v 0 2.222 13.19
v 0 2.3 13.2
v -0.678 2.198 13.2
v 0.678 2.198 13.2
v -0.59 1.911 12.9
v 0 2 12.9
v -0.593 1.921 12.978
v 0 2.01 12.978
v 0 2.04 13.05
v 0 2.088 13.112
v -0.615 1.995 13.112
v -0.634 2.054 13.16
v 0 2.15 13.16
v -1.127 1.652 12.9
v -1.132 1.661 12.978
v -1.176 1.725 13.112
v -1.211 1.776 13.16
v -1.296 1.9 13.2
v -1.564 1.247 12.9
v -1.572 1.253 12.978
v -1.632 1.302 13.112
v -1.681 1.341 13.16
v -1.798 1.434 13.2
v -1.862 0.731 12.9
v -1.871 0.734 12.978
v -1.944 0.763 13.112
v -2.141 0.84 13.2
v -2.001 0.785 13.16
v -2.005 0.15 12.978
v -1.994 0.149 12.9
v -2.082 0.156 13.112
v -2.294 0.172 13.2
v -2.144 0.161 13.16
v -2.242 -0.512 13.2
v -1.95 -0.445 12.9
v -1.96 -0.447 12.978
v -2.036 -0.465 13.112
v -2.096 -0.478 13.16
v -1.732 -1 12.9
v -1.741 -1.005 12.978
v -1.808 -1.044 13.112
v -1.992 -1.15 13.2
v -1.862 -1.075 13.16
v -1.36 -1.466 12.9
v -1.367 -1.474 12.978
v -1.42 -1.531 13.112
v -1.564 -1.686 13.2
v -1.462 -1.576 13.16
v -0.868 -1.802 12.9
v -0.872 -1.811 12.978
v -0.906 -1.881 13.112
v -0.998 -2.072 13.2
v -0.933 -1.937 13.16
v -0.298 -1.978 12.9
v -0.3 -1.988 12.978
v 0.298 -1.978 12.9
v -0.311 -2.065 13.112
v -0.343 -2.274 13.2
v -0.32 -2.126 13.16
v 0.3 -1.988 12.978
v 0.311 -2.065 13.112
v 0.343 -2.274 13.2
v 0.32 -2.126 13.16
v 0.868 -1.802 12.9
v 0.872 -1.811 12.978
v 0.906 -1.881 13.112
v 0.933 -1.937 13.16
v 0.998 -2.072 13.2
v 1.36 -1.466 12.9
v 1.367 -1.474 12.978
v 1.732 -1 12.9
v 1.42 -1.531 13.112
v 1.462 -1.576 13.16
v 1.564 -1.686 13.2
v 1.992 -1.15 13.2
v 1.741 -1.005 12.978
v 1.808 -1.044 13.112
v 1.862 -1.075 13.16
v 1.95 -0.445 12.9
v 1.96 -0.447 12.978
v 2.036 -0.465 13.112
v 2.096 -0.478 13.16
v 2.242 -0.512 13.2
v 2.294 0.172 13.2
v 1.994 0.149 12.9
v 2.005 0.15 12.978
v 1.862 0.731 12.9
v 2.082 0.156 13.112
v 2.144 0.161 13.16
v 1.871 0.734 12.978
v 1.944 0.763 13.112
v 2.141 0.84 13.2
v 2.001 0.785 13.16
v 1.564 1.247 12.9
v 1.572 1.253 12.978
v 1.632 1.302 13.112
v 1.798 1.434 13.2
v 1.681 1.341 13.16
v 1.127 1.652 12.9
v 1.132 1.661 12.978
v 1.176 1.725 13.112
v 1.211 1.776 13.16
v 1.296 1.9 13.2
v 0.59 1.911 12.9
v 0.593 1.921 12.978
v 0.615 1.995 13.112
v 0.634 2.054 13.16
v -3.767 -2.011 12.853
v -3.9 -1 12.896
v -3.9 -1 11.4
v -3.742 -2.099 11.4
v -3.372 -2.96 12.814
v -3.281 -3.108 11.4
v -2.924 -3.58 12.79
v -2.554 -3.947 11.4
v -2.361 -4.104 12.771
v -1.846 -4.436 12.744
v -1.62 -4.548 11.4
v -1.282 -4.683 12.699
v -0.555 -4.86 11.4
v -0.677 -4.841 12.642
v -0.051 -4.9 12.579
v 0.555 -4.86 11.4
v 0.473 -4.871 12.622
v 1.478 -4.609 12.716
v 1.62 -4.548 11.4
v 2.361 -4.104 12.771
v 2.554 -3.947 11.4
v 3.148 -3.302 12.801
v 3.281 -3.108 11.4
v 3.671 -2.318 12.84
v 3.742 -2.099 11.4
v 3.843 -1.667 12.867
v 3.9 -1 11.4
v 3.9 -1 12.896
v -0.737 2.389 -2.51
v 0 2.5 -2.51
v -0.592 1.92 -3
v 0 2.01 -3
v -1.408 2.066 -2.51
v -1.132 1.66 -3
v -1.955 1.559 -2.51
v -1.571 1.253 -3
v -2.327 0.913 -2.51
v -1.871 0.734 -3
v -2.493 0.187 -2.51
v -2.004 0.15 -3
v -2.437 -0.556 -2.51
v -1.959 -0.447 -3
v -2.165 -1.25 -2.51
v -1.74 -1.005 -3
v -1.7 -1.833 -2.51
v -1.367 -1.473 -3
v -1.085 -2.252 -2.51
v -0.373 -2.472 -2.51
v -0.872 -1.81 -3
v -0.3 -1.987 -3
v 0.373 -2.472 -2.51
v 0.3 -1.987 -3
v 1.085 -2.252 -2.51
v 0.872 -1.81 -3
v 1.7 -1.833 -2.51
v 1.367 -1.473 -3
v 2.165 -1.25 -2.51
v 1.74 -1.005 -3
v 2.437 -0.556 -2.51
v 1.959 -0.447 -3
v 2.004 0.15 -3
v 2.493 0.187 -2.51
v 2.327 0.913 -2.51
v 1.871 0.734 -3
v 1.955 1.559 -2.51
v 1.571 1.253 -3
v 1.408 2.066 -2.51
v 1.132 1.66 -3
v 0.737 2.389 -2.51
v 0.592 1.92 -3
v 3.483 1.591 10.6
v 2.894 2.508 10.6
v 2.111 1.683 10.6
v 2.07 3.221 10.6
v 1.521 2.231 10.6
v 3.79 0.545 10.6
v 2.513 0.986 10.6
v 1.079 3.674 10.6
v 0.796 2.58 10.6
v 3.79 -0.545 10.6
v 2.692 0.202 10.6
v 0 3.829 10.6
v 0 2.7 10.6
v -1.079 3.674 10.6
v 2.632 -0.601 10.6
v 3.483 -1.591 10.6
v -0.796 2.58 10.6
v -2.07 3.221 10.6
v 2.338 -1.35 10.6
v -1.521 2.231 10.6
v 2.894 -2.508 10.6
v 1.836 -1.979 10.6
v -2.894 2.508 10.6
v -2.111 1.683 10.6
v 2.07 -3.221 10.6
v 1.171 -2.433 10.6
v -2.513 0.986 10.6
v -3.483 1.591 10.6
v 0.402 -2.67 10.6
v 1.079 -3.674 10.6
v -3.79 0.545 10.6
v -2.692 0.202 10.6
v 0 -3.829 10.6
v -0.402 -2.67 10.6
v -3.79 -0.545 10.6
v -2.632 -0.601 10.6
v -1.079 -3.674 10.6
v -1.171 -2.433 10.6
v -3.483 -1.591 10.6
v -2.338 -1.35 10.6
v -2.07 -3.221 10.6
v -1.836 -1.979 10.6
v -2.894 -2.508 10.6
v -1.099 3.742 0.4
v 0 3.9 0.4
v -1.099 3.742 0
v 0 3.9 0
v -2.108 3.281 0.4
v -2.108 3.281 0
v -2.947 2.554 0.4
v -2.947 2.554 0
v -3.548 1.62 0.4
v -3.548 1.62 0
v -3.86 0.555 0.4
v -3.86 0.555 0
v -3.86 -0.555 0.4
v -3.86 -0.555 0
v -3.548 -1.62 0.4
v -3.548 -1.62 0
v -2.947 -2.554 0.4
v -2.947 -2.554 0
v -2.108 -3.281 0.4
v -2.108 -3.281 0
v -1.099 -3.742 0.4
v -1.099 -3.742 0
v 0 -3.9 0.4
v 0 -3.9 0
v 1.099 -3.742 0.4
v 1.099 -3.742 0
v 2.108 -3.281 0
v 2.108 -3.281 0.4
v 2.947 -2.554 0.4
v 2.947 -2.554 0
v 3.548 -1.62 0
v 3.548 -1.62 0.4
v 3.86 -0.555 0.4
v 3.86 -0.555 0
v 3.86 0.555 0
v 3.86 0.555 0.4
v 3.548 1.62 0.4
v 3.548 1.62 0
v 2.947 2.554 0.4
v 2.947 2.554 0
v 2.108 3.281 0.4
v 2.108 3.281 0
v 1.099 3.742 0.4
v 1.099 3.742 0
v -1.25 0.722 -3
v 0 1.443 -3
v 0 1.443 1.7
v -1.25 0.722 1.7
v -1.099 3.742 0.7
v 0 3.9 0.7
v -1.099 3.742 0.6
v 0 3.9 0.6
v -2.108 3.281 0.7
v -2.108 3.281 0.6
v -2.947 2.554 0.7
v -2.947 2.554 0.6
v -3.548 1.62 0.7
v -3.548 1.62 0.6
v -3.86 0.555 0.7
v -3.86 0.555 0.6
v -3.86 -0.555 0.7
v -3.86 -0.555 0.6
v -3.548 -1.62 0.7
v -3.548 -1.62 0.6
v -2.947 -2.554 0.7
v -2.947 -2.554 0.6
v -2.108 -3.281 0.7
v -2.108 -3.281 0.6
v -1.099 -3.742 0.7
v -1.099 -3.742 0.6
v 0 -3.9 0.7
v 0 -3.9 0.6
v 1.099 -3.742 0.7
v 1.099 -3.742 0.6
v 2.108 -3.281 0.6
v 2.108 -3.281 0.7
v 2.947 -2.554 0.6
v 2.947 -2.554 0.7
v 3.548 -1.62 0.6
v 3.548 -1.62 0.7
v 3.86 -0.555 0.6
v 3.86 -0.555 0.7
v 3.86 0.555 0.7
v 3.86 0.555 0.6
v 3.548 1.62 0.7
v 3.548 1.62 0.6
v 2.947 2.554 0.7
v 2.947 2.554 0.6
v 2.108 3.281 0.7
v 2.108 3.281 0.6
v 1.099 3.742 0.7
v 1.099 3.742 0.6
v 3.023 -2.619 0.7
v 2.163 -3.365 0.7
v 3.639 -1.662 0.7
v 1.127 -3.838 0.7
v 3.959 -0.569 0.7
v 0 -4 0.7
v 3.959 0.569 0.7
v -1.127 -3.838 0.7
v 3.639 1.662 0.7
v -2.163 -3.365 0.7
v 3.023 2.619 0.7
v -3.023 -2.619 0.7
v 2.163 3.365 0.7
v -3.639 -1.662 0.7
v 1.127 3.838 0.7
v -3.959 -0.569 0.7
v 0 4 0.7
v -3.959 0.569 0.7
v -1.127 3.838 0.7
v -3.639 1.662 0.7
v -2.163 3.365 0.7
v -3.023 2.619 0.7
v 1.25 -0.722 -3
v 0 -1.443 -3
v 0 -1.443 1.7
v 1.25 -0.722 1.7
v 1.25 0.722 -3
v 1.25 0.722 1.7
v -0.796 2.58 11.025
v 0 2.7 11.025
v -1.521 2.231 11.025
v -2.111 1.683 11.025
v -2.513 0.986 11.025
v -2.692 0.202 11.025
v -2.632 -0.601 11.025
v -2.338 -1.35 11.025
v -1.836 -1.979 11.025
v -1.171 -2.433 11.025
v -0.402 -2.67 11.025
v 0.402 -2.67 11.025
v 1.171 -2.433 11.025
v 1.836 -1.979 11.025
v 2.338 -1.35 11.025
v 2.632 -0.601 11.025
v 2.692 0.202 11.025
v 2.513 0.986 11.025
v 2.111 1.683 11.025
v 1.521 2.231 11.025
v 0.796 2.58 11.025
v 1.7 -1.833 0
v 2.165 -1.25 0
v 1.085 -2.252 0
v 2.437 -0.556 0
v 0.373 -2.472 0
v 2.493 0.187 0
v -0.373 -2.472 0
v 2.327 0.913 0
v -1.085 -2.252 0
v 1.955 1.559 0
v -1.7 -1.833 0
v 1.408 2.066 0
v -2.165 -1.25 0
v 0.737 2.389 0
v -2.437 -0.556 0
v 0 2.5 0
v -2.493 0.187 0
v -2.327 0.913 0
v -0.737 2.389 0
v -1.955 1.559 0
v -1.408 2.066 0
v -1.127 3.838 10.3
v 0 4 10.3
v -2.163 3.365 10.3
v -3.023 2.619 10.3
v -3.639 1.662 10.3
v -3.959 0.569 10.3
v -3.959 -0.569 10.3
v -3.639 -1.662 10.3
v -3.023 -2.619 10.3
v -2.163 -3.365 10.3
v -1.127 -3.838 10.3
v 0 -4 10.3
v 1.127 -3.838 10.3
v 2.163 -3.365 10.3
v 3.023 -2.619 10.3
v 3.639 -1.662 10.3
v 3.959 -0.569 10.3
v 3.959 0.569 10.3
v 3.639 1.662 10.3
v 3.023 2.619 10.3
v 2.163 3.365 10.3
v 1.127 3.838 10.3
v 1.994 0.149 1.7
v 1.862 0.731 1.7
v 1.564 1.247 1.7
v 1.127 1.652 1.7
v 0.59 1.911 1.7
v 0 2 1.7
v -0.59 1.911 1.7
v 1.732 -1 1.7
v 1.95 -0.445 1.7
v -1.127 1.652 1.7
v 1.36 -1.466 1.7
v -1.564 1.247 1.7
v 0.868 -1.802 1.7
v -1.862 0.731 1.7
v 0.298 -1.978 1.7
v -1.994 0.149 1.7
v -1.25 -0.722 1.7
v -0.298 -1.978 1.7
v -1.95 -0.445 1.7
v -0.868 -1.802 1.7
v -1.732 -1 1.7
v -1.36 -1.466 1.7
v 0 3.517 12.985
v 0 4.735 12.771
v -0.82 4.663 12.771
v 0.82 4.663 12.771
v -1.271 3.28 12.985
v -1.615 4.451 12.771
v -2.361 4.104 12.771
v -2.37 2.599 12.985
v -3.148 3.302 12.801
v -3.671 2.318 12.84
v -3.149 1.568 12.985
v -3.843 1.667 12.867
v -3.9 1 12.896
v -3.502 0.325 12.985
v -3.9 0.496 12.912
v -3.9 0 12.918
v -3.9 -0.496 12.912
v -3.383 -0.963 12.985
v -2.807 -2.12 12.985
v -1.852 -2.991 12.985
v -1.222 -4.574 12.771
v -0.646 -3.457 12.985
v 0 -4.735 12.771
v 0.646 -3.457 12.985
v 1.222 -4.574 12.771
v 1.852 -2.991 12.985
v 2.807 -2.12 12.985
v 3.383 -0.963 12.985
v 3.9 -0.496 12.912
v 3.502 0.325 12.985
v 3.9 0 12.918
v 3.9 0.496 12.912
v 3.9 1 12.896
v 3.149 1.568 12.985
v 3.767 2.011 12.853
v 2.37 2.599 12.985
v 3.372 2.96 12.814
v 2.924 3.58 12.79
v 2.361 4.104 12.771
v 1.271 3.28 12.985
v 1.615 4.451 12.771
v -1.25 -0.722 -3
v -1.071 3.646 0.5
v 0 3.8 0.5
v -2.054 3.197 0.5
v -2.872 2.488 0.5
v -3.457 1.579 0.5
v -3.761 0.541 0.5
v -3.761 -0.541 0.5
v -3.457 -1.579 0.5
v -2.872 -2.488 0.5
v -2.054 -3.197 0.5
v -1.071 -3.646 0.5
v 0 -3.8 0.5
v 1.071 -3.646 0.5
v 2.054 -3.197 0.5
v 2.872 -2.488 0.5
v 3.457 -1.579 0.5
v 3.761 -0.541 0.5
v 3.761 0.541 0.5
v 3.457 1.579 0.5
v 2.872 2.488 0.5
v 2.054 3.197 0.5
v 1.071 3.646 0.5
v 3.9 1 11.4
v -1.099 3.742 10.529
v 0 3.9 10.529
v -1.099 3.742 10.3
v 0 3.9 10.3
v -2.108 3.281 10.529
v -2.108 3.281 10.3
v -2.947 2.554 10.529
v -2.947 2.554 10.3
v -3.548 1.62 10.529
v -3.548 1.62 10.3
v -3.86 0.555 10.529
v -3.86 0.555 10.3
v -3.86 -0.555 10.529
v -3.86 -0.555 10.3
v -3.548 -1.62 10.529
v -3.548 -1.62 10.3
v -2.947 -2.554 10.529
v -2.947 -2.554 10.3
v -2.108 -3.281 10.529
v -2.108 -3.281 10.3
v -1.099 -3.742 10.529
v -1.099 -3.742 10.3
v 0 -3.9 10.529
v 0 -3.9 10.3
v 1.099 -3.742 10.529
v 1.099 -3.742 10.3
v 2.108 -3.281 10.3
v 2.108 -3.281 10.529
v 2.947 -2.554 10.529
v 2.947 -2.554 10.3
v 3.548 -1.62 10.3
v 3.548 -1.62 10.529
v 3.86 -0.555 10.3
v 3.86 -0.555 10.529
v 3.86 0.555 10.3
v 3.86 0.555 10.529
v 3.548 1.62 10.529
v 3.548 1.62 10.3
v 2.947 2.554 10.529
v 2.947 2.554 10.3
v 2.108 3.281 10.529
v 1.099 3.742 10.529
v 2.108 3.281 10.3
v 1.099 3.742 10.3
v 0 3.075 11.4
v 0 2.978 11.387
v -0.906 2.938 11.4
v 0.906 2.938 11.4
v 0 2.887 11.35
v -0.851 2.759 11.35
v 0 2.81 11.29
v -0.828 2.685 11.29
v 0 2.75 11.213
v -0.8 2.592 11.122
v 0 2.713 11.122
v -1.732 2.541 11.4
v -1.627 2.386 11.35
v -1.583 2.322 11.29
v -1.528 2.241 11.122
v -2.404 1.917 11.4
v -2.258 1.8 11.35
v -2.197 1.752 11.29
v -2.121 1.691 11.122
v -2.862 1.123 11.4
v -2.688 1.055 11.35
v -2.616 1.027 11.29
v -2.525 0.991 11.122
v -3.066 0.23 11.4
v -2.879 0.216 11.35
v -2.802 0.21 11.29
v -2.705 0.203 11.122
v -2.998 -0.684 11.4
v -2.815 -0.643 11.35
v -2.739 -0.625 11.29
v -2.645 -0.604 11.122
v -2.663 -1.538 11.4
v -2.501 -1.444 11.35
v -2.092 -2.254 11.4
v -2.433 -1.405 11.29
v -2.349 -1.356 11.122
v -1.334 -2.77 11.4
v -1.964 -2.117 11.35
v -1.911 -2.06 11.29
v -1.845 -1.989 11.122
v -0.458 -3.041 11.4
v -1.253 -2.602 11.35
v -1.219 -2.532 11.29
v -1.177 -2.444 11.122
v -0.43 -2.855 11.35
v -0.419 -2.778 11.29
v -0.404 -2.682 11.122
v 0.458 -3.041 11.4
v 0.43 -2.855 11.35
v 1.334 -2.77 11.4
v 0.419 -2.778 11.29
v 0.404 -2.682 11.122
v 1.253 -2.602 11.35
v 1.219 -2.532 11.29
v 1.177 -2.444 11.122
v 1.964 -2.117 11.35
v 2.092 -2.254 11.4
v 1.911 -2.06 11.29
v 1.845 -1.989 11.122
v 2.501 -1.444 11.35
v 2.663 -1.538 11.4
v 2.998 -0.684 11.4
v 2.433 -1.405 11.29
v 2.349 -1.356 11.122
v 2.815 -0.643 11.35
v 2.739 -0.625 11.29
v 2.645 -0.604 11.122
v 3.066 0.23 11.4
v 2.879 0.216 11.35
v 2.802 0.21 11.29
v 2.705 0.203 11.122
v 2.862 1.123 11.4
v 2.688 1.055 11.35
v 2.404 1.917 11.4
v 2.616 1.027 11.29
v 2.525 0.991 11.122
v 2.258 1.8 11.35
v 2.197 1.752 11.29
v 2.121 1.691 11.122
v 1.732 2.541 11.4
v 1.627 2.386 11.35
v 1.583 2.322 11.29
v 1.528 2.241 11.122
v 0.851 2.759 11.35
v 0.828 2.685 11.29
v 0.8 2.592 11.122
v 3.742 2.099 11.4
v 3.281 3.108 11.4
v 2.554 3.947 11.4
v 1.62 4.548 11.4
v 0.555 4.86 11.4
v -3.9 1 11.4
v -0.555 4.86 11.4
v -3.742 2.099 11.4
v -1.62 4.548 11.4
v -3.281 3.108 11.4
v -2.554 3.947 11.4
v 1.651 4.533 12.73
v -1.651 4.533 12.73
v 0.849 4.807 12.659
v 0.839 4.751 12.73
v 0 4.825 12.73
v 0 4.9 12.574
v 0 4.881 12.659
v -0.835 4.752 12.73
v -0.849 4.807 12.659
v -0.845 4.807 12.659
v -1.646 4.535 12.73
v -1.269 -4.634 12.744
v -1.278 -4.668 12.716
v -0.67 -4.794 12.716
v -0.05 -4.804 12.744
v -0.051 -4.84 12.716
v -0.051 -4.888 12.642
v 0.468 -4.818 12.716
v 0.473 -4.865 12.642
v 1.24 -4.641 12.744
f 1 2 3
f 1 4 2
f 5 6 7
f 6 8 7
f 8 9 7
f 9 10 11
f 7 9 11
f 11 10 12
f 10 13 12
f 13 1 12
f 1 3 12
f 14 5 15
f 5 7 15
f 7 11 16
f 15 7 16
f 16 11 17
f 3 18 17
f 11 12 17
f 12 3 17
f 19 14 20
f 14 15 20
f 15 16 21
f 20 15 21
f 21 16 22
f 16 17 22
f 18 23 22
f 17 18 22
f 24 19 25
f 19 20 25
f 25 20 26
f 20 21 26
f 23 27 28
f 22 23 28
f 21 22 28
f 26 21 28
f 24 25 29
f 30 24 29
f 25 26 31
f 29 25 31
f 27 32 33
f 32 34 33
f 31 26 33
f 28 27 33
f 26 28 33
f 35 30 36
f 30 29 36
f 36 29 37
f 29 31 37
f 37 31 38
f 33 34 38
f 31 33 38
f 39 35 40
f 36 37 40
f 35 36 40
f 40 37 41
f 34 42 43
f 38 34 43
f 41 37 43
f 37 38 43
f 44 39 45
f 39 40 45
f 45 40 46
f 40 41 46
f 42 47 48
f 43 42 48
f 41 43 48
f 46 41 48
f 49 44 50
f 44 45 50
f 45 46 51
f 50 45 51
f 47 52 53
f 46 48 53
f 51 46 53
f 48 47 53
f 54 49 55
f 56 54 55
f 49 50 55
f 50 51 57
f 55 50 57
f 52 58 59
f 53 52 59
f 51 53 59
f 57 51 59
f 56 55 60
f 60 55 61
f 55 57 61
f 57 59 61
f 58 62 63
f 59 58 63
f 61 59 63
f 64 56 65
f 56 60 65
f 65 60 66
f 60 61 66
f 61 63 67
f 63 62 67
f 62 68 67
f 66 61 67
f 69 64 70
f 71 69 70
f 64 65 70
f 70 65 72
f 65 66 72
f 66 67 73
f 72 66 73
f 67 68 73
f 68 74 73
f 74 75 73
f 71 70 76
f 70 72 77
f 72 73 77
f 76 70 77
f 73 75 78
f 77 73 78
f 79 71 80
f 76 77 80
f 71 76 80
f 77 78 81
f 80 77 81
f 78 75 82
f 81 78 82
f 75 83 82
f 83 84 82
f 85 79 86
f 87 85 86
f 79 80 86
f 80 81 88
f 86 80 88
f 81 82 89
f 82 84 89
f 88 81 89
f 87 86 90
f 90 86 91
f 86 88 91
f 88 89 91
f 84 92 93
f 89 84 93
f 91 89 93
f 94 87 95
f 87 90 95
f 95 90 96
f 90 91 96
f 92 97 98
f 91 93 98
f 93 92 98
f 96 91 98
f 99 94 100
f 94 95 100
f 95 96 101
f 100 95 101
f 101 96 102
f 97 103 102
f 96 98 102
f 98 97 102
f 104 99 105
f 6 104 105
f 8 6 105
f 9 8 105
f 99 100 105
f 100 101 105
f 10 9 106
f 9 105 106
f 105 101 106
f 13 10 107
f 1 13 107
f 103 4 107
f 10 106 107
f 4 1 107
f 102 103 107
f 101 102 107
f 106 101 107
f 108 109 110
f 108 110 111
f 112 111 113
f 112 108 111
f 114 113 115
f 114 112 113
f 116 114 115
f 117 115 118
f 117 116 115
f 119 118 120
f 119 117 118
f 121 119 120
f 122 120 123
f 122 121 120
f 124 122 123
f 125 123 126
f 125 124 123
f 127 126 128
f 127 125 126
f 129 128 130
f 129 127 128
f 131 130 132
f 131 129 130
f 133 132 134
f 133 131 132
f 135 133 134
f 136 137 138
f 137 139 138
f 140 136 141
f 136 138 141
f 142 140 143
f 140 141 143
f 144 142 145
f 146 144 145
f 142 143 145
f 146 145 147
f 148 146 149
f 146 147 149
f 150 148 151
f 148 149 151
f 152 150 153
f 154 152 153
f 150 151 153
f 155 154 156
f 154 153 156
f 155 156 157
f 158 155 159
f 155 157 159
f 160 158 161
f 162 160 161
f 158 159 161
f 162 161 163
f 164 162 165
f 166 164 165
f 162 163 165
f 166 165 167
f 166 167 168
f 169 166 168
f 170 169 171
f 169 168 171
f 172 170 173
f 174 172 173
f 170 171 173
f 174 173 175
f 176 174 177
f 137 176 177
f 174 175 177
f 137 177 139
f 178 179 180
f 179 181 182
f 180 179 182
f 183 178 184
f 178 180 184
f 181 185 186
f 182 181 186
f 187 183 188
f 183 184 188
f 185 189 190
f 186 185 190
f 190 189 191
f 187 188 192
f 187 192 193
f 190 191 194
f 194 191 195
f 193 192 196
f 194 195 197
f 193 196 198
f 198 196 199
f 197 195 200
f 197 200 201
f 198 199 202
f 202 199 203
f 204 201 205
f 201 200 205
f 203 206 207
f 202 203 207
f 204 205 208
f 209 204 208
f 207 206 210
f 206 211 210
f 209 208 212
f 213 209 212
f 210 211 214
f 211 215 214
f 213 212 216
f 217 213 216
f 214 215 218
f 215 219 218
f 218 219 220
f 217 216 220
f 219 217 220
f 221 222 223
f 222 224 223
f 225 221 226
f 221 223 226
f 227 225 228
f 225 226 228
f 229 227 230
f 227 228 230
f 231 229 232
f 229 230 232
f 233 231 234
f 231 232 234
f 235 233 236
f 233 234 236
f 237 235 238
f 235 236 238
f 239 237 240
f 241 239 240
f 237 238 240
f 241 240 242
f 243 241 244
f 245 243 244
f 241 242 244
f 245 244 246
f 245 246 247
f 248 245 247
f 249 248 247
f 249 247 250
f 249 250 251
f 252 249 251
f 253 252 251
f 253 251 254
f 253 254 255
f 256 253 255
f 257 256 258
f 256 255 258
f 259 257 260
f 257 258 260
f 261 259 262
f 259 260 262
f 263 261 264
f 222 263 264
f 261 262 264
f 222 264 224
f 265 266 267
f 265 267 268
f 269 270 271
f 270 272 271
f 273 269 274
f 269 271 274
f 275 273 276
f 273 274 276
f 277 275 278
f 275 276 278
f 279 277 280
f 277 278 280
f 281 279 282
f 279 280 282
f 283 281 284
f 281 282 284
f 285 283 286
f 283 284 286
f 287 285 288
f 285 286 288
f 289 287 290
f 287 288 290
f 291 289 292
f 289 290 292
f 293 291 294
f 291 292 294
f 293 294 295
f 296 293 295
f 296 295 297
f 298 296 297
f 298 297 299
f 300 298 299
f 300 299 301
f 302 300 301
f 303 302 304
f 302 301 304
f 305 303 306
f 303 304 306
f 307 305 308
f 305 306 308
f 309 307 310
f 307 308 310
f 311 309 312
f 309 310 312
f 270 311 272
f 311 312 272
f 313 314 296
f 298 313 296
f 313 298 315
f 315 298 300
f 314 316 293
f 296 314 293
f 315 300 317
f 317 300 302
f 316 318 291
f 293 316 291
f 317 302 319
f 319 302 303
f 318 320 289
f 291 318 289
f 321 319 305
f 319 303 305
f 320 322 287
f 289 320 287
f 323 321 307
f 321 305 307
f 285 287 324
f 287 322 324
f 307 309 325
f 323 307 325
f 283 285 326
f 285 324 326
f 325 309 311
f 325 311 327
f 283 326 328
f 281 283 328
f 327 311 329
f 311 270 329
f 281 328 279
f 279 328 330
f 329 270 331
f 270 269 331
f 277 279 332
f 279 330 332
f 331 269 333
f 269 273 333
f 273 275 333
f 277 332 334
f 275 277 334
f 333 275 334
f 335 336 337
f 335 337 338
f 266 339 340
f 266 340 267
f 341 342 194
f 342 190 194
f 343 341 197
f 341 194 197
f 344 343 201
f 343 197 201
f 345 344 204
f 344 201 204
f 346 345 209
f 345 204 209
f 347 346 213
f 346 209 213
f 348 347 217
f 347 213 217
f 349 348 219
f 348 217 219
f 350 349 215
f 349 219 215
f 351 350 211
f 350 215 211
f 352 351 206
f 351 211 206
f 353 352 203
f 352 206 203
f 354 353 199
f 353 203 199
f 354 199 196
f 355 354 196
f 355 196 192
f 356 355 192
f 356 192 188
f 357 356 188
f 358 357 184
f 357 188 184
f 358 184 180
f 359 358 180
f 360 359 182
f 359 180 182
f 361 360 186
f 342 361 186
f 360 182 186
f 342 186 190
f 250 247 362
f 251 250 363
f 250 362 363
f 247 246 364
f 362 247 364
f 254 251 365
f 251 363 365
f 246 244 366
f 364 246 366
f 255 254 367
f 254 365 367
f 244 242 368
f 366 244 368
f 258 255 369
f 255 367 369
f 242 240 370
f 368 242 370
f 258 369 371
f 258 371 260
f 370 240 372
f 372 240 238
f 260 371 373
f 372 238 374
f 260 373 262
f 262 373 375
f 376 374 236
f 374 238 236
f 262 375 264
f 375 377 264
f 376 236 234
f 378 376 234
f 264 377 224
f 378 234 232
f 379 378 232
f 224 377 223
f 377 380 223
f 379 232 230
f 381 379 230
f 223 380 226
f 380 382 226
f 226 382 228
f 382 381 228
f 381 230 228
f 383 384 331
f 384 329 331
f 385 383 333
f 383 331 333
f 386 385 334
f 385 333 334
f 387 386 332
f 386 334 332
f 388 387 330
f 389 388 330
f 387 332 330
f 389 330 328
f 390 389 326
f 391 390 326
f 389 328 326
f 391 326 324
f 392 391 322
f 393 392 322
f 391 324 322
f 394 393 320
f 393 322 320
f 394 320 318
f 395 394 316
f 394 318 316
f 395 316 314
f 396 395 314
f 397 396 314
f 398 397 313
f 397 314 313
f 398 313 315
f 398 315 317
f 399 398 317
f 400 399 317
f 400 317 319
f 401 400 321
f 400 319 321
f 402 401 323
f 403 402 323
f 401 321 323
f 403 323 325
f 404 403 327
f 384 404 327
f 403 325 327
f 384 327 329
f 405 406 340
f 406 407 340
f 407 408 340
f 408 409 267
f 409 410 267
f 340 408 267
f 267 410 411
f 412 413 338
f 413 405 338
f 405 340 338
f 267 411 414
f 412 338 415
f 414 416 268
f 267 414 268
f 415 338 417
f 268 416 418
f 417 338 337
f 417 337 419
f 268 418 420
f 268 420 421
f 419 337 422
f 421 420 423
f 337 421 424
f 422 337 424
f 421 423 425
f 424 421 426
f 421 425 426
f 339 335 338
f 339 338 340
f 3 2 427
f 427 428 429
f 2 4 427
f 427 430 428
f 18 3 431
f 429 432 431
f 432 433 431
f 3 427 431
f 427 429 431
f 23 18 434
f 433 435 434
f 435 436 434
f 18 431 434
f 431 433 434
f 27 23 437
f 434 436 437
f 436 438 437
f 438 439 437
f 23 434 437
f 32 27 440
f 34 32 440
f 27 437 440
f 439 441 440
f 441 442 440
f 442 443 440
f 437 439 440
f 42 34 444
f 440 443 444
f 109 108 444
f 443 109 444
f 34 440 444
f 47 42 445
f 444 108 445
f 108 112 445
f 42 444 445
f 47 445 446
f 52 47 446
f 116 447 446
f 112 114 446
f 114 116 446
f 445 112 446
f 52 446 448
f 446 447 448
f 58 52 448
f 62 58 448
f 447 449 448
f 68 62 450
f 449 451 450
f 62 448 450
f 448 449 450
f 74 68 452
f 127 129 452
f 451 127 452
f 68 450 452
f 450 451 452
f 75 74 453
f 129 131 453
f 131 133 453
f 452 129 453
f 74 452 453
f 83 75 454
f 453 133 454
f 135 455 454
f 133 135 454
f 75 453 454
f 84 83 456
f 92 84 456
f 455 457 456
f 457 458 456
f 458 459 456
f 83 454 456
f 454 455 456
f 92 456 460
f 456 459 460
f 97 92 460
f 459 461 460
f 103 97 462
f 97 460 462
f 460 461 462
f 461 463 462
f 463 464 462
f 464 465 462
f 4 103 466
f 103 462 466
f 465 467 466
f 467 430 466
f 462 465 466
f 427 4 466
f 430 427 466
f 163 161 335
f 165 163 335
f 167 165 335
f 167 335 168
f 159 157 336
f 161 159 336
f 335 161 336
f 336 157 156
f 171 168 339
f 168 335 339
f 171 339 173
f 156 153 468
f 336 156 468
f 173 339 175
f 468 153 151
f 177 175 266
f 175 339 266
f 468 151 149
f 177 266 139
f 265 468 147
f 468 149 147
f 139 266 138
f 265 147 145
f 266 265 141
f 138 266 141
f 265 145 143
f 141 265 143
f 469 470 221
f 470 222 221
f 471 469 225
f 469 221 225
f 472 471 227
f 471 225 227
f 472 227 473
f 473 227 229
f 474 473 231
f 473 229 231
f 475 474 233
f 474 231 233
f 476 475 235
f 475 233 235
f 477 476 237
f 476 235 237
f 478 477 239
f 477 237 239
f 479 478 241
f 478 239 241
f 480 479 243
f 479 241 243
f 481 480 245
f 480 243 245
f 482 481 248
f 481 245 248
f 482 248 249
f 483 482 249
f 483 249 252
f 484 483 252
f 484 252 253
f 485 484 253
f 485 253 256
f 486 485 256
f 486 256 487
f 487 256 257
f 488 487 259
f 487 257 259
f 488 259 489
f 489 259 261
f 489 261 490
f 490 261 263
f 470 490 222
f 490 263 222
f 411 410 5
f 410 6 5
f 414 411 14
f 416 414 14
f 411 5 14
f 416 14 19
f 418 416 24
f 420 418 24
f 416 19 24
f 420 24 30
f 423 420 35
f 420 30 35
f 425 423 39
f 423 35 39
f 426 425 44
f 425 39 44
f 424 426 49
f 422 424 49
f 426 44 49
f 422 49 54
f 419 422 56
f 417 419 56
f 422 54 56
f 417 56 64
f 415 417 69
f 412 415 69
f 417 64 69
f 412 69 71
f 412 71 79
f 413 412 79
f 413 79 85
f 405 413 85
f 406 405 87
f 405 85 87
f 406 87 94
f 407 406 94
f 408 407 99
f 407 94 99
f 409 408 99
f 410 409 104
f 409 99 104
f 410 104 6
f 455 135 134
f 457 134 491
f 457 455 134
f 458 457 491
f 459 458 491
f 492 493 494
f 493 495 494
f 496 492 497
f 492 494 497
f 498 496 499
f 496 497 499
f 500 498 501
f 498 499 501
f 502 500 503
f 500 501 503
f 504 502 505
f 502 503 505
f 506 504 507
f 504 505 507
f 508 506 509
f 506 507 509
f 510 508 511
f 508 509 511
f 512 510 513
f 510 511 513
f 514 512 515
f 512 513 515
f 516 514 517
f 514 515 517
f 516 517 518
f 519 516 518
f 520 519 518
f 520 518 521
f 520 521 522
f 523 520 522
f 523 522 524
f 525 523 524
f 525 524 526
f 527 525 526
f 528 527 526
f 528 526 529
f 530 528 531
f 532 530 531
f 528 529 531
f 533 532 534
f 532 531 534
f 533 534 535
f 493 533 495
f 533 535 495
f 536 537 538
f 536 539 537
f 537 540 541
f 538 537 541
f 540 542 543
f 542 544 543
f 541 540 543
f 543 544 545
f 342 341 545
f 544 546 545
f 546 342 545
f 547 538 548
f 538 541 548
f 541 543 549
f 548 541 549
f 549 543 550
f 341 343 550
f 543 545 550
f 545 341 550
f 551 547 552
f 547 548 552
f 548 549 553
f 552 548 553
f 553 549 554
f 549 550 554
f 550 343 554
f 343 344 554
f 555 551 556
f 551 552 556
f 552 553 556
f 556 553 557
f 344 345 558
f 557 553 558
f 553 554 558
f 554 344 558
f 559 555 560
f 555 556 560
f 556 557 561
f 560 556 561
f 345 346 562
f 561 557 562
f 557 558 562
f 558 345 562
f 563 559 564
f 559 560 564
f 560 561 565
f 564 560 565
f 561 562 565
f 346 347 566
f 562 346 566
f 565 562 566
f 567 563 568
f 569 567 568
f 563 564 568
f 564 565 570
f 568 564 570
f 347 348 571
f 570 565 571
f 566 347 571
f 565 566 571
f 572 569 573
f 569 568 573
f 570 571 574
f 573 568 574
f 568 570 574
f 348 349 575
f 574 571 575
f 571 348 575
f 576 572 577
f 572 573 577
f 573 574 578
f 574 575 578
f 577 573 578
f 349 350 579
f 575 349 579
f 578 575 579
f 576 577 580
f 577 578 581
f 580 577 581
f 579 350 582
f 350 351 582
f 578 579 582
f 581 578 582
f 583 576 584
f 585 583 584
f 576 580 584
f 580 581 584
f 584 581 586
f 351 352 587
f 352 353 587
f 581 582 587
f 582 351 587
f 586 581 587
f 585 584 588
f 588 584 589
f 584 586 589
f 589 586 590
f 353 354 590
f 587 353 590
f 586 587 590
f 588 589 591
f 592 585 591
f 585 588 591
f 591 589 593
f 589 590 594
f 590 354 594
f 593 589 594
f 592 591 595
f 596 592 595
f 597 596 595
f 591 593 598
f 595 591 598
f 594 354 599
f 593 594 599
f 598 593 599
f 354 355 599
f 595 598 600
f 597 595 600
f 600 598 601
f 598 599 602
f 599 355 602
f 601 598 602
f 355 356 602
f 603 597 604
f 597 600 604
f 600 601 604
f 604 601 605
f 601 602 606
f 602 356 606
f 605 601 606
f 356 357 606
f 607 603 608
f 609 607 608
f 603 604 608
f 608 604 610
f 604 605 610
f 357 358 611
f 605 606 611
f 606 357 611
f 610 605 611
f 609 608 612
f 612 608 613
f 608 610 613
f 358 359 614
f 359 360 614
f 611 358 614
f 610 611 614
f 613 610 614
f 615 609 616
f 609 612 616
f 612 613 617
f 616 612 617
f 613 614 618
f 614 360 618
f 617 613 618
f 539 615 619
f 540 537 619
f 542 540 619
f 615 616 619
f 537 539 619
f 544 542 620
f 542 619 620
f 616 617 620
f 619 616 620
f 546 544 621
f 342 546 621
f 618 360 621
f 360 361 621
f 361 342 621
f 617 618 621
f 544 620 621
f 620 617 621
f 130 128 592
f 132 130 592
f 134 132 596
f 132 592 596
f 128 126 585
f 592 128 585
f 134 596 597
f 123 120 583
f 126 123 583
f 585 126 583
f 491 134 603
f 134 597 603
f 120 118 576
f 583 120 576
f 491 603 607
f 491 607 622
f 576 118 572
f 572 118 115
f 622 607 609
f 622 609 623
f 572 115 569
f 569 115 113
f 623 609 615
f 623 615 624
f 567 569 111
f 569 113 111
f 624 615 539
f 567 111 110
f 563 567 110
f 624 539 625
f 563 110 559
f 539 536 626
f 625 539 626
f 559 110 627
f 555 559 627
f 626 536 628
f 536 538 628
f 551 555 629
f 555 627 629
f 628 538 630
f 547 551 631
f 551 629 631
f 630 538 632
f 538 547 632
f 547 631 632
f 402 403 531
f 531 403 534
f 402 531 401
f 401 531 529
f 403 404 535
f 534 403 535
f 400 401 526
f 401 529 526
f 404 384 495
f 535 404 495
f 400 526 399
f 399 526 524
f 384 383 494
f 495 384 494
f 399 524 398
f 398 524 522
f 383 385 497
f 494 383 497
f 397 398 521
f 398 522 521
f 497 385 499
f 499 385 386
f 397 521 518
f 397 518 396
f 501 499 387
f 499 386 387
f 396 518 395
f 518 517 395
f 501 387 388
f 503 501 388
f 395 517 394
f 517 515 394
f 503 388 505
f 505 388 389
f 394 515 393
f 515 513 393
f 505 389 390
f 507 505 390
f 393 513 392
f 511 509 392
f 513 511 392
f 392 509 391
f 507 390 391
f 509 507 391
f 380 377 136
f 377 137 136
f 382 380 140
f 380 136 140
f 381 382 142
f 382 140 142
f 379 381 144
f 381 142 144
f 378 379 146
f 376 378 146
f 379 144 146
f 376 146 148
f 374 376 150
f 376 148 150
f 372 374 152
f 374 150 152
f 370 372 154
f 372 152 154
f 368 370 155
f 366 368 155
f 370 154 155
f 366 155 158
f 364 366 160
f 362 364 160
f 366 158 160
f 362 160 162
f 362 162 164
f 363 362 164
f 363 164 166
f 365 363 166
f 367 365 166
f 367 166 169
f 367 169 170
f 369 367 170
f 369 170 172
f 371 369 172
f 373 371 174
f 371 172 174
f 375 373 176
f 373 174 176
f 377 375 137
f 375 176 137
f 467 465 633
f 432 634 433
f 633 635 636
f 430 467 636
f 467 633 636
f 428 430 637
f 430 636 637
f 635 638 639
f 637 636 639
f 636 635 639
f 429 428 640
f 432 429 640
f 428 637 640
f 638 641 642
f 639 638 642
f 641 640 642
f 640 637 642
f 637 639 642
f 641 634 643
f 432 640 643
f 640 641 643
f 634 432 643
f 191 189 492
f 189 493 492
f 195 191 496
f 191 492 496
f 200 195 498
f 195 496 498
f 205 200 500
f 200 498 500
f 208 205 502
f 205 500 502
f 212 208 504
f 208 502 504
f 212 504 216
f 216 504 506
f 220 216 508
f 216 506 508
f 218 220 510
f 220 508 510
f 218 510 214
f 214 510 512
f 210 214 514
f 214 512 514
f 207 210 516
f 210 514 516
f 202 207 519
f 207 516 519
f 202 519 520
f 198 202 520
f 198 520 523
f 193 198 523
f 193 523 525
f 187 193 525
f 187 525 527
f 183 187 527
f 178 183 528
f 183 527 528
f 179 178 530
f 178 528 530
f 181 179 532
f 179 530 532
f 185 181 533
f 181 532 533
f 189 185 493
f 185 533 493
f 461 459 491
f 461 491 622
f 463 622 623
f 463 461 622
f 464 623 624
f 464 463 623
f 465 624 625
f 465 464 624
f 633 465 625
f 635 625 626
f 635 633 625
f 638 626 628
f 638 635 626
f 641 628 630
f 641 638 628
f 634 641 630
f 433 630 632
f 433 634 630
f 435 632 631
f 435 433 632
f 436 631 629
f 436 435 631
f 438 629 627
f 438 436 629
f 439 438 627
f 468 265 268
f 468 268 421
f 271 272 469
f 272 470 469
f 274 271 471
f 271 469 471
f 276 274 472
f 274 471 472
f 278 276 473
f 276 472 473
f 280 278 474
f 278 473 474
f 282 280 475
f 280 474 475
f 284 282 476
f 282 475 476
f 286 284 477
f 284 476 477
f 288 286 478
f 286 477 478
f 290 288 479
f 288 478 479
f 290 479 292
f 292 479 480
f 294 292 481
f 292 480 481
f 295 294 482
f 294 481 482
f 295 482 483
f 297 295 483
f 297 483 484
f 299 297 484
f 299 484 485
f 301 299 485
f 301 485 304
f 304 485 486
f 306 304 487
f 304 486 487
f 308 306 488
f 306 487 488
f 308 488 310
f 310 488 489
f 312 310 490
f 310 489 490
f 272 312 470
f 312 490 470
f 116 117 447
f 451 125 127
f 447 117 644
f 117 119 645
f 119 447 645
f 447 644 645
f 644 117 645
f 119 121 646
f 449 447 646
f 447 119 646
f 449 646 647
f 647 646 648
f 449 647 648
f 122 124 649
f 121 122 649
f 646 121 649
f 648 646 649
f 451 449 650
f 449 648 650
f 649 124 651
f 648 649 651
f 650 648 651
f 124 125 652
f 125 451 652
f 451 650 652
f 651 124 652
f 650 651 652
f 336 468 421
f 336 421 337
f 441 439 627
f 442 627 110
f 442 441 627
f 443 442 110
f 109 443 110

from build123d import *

# Parameters (mm, degrees)
CUT_EXTRUDE1_DEPTH = 4.7
SKETCH3_W          = 20
SKETCH3_H          = 20
CUT_EXTRUDE2_DEPTH = 2


with BuildPart() as part:
    # Sketch1 → Revolve1 (revolve)
    with BuildSketch(Plane(origin=(0, 0, 0), x_dir=(0, 0, -1), z_dir=(1, 0, 0))):
        with BuildLine():
            Line((-1.7, 0), (-1.7, 2))
            Line((-1.7, 2), (-12.9, 2))
            ThreePointArc((-12.9, 2), (-13.112132034, 2.087867966), (-13.2, 2.3))
            Line((-13.2, 2.3), (-12.770691475, 4.734729636))
            ThreePointArc((-12.770691475, 4.734729636), (-12.702287446, 4.853208889), (-12.573729924, 4.9))
            Line((-12.573729924, 4.9), (-11.4, 4.9))
            Line((-11.4, 4.9), (-11.4, 3.075))
            ThreePointArc((-11.4, 3.075), (-11.290165043, 2.809834957), (-11.025, 2.7))
            Line((-11.025, 2.7), (-10.6, 2.7))
            Line((-10.6, 2.7), (-10.6, 3.829289322))
            Line((-10.6, 3.829289322), (-10.529289322, 3.9))
            Line((-10.529289322, 3.9), (-10.3, 3.9))
            Line((-10.3, 3.9), (-10.3, 4))
            Line((-10.3, 4), (-0.7, 4))
            Line((-0.7, 4), (-0.7, 3.9))
            Line((-0.7, 3.9), (-0.6, 3.9))
            Line((-0.6, 3.9), (-0.5, 3.8))
            Line((-0.5, 3.8), (-0.4, 3.9))
            Line((-0.4, 3.9), (0, 3.9))
            Line((0, 3.9), (0, 2.5))
            Line((0, 2.5), (2.5095, 2.5))
            Line((2.5095, 2.5), (3, 2.0095))
            Line((3, 2.0095), (3, 0))
            Line((3, 0), (-1.7, 0))
        make_face()
    revolve(axis=Axis((0, 0, -3), (0, 0, 1)))

    # Sketch2 → Cut-Extrude1 (cut)
    with BuildSketch(Plane.XY.offset(-3)):
        Polygon((-1.25, -0.721687836), (0, -1.443375673), (1.25, -0.721687836), (1.25, 0.721687836), (0, 1.443375673), (-1.25, 0.721687836), align=None)
    extrude(amount=CUT_EXTRUDE1_DEPTH, mode=Mode.SUBTRACT)

    # Sketch3 → Cut-Extrude2 (cut)
    with BuildSketch(Plane.XY.offset(13.2)):
        Rectangle(SKETCH3_W, SKETCH3_H)
        with BuildLine():
            Line((-3.9, 1), (-3.9, -1))
            ThreePointArc((-3.9, -1), (0, -4.899999854), (3.9, -1))
            Line((3.9, -1), (3.9, 1))
            ThreePointArc((3.9, 1), (0, 4.9), (-3.9, 1))
        make_face(mode=Mode.SUBTRACT)
    extrude(amount=-CUT_EXTRUDE2_DEPTH, mode=Mode.SUBTRACT)


solid = part.part
